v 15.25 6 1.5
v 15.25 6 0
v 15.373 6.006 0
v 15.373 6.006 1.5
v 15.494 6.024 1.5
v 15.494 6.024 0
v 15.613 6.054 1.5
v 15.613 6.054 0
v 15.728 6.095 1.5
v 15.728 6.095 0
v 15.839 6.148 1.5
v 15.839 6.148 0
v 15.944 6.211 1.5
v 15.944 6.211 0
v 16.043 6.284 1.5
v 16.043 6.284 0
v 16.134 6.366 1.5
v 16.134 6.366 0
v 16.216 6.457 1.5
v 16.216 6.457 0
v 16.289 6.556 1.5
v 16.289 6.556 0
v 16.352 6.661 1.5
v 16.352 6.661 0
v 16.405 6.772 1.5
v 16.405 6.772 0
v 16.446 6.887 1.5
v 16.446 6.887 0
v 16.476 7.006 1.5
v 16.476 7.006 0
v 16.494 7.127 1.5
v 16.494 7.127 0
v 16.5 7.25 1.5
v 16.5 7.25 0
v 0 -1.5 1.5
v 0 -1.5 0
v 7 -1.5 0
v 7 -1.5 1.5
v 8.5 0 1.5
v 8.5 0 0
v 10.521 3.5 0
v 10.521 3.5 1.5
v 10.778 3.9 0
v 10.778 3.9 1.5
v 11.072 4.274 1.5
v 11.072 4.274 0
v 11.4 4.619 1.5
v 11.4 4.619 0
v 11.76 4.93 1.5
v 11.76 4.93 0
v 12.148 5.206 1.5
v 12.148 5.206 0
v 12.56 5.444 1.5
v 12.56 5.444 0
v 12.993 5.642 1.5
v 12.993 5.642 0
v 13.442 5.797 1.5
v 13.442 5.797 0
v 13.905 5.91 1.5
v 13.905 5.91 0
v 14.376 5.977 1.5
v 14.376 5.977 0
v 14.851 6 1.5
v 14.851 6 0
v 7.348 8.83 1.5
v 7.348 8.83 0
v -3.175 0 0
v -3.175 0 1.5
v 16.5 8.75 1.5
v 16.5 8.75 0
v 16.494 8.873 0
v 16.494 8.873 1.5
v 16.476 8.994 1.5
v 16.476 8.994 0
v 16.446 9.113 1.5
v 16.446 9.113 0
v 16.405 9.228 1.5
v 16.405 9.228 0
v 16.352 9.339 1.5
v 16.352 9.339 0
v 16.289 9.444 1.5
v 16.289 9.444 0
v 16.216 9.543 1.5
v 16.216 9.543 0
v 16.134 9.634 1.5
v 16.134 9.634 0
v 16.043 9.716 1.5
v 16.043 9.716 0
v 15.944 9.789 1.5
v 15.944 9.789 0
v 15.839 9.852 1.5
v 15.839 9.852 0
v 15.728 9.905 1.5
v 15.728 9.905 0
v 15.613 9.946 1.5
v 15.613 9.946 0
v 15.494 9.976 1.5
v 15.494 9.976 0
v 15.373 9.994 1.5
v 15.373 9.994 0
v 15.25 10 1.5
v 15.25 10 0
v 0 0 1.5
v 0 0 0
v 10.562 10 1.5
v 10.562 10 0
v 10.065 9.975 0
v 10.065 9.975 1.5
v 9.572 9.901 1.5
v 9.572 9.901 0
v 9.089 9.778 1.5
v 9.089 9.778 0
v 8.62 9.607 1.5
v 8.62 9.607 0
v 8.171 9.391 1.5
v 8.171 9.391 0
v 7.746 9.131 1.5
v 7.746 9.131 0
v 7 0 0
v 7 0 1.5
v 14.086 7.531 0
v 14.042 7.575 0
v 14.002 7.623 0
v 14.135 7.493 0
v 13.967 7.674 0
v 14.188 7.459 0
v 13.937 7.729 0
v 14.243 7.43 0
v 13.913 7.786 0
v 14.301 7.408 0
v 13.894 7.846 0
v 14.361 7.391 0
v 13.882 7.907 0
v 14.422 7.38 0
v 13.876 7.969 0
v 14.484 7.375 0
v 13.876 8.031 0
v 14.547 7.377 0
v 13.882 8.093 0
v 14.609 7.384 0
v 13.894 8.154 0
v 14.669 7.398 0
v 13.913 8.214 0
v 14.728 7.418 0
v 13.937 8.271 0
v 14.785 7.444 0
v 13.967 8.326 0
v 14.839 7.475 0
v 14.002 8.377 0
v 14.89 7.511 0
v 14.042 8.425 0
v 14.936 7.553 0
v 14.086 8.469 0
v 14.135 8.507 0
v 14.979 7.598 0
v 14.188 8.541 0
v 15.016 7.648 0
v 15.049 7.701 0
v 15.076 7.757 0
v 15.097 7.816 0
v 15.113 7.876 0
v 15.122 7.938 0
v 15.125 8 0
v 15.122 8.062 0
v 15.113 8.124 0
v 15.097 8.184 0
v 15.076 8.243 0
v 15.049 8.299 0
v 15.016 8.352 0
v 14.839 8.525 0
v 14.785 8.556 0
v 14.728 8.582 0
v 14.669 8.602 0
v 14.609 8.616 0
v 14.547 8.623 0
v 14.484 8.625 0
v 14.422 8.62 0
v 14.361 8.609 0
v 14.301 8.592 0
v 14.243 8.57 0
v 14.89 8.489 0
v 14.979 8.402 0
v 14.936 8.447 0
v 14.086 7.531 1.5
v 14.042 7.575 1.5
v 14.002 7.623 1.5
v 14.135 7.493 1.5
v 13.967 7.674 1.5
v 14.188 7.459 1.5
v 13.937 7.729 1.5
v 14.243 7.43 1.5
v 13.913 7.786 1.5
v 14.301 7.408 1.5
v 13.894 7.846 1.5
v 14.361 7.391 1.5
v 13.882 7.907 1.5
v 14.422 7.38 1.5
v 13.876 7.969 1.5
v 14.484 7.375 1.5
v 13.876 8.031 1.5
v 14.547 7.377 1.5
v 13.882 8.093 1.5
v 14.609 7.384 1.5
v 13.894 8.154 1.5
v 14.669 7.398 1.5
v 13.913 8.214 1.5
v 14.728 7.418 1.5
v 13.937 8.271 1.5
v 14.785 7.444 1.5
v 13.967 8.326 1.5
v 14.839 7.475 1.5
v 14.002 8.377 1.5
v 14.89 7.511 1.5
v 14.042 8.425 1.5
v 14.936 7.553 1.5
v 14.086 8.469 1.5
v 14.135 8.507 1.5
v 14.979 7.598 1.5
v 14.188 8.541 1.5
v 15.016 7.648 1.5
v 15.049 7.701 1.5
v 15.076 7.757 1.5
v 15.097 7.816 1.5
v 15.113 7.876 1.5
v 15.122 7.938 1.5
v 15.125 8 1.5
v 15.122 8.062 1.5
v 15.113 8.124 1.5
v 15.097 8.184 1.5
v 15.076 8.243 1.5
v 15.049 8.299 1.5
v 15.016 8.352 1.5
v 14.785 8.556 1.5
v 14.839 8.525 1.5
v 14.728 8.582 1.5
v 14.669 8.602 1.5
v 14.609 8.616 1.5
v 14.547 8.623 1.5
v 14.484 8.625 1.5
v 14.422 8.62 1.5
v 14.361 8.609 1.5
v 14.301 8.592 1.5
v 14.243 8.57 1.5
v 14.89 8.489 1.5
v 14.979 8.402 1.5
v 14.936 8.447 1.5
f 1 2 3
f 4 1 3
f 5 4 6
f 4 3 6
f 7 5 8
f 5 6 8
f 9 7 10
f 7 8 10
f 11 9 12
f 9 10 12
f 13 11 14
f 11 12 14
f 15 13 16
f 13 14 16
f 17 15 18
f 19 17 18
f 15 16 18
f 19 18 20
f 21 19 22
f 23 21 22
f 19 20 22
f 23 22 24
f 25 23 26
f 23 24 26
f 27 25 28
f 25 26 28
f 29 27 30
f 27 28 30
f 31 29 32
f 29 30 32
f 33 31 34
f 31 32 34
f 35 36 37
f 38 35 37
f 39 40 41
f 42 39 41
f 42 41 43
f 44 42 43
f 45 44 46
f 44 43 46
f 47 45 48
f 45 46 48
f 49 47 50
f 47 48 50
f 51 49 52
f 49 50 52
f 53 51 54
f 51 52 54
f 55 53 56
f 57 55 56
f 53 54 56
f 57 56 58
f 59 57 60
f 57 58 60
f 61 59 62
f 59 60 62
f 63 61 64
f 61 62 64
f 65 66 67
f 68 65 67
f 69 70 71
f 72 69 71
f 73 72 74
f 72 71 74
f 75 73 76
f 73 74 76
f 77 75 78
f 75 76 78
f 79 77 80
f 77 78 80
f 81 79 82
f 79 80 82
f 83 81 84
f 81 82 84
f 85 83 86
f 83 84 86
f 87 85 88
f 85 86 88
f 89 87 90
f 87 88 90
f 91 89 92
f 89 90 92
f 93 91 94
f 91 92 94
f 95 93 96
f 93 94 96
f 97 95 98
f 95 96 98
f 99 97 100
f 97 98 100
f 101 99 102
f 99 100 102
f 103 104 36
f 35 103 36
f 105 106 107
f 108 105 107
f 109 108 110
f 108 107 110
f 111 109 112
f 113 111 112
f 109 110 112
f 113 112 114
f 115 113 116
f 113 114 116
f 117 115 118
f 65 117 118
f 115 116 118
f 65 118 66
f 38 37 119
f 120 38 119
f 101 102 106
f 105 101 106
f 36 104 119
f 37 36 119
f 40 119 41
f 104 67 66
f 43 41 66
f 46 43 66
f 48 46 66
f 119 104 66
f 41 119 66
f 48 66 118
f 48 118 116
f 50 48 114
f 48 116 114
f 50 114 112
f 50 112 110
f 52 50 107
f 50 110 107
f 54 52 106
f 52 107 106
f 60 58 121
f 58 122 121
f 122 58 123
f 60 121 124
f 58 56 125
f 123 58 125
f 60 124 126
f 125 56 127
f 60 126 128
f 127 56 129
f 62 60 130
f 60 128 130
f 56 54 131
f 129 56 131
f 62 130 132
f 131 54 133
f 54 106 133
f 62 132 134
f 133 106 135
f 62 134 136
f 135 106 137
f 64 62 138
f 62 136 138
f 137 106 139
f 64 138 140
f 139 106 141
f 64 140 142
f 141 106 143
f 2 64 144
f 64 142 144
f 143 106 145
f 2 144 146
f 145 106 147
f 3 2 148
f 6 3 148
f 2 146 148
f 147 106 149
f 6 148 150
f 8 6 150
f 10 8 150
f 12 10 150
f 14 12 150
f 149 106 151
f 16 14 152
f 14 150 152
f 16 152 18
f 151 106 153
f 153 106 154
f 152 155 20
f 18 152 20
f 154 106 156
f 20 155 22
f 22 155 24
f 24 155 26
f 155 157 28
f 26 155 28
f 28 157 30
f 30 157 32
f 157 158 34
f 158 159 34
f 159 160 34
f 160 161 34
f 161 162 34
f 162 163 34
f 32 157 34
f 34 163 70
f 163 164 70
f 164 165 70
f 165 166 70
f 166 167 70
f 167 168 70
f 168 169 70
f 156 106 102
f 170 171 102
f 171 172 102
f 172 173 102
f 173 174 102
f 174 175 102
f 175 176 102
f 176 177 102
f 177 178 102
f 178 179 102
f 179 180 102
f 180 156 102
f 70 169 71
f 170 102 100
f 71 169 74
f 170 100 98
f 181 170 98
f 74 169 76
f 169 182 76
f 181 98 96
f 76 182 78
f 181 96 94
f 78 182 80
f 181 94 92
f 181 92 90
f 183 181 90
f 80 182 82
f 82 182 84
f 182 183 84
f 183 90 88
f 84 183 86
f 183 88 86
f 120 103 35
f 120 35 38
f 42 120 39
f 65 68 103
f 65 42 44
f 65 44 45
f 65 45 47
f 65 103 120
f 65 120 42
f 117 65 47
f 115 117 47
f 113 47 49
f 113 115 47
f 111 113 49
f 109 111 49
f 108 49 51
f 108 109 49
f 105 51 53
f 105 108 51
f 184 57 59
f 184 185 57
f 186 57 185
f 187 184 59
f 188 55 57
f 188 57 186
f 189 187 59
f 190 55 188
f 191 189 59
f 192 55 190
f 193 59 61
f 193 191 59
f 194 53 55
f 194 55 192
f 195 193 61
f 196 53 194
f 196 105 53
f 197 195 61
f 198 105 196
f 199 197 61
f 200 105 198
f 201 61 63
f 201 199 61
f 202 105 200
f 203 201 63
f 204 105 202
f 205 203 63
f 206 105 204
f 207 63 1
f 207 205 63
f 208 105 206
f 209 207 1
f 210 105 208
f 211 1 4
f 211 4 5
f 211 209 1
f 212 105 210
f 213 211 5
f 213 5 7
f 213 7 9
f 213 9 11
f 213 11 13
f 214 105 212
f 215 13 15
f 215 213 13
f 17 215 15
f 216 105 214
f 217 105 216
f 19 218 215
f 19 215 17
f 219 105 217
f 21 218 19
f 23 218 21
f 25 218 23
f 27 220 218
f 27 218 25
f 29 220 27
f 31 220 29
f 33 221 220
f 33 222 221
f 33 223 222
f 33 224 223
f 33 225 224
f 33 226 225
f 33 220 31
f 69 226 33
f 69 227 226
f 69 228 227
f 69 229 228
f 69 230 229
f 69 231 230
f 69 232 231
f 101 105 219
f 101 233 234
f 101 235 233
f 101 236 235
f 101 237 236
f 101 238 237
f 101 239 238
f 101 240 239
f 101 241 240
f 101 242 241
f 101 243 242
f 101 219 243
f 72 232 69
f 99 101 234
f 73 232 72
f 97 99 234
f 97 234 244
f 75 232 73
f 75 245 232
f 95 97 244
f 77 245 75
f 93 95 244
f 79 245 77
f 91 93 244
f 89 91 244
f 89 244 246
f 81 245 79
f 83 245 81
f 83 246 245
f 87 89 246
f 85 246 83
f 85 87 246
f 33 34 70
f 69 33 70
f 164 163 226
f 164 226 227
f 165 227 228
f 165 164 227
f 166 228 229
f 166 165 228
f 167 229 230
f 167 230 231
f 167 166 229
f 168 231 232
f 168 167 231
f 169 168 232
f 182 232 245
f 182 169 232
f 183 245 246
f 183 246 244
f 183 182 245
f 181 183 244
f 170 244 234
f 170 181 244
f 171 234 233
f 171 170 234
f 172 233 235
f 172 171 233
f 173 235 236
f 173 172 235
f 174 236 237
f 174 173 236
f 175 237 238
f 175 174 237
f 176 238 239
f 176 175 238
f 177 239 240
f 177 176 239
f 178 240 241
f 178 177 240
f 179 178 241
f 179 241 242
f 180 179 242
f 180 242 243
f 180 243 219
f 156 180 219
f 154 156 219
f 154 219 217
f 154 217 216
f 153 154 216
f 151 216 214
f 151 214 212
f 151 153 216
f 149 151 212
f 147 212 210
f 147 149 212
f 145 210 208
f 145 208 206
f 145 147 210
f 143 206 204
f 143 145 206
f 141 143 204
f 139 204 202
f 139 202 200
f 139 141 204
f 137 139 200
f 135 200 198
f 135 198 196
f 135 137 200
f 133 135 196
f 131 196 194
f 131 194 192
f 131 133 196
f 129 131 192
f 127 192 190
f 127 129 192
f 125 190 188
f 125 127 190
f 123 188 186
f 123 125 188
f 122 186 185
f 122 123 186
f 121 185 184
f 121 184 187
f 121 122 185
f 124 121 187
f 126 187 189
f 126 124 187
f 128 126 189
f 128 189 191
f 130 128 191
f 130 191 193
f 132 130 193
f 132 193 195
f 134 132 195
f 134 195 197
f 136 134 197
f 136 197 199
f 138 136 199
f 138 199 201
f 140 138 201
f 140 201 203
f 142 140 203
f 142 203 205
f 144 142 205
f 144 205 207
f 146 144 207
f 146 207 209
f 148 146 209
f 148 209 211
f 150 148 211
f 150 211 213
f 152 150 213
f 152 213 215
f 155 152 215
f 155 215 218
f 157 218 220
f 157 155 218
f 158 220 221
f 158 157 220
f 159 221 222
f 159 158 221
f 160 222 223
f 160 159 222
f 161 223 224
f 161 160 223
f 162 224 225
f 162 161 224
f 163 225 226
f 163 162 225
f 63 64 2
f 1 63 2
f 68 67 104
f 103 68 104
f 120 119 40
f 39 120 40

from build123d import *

# Parameters (mm, degrees)
F0_R     = 0.625
F1_DEPTH = 1.5


with BuildPart() as f1:
    # F0 (on Top) → F1 (new body)
    with BuildSketch(Plane.XY):
        with BuildLine():
            Line((-3.175, 0), (0, 0))
            Line((0, 0), (0, -1.5))
            Line((0, -1.5), (7, -1.5))
            Line((7, -1.5), (7, 0))
            Line((7, 0), (8.5, 0))
            Line((8.5, 0), (10.520726, 3.5))
            ThreePointArc((10.520726, 3.5), (12.350853, 5.330127), (14.850853, 6))
            Line((14.850853, 6), (15.25, 6))
            ThreePointArc((15.25, 6), (16.133883, 6.366117), (16.5, 7.25))
            Line((16.5, 7.25), (16.5, 8.75))
            ThreePointArc((16.5, 8.75), (16.133883, 9.633883), (15.25, 10))
            Line((15.25, 10), (10.562387, 10))
            ThreePointArc((10.562387, 10), (8.852286, 9.698463), (7.348449, 8.830222))
            Line((7.348449, 8.830222), (-3.175, 0))
        make_face()
        with Locations((14.5, 8)):
            Circle(F0_R, mode=Mode.SUBTRACT)
    extrude(amount=F1_DEPTH)


solid = f1.part
